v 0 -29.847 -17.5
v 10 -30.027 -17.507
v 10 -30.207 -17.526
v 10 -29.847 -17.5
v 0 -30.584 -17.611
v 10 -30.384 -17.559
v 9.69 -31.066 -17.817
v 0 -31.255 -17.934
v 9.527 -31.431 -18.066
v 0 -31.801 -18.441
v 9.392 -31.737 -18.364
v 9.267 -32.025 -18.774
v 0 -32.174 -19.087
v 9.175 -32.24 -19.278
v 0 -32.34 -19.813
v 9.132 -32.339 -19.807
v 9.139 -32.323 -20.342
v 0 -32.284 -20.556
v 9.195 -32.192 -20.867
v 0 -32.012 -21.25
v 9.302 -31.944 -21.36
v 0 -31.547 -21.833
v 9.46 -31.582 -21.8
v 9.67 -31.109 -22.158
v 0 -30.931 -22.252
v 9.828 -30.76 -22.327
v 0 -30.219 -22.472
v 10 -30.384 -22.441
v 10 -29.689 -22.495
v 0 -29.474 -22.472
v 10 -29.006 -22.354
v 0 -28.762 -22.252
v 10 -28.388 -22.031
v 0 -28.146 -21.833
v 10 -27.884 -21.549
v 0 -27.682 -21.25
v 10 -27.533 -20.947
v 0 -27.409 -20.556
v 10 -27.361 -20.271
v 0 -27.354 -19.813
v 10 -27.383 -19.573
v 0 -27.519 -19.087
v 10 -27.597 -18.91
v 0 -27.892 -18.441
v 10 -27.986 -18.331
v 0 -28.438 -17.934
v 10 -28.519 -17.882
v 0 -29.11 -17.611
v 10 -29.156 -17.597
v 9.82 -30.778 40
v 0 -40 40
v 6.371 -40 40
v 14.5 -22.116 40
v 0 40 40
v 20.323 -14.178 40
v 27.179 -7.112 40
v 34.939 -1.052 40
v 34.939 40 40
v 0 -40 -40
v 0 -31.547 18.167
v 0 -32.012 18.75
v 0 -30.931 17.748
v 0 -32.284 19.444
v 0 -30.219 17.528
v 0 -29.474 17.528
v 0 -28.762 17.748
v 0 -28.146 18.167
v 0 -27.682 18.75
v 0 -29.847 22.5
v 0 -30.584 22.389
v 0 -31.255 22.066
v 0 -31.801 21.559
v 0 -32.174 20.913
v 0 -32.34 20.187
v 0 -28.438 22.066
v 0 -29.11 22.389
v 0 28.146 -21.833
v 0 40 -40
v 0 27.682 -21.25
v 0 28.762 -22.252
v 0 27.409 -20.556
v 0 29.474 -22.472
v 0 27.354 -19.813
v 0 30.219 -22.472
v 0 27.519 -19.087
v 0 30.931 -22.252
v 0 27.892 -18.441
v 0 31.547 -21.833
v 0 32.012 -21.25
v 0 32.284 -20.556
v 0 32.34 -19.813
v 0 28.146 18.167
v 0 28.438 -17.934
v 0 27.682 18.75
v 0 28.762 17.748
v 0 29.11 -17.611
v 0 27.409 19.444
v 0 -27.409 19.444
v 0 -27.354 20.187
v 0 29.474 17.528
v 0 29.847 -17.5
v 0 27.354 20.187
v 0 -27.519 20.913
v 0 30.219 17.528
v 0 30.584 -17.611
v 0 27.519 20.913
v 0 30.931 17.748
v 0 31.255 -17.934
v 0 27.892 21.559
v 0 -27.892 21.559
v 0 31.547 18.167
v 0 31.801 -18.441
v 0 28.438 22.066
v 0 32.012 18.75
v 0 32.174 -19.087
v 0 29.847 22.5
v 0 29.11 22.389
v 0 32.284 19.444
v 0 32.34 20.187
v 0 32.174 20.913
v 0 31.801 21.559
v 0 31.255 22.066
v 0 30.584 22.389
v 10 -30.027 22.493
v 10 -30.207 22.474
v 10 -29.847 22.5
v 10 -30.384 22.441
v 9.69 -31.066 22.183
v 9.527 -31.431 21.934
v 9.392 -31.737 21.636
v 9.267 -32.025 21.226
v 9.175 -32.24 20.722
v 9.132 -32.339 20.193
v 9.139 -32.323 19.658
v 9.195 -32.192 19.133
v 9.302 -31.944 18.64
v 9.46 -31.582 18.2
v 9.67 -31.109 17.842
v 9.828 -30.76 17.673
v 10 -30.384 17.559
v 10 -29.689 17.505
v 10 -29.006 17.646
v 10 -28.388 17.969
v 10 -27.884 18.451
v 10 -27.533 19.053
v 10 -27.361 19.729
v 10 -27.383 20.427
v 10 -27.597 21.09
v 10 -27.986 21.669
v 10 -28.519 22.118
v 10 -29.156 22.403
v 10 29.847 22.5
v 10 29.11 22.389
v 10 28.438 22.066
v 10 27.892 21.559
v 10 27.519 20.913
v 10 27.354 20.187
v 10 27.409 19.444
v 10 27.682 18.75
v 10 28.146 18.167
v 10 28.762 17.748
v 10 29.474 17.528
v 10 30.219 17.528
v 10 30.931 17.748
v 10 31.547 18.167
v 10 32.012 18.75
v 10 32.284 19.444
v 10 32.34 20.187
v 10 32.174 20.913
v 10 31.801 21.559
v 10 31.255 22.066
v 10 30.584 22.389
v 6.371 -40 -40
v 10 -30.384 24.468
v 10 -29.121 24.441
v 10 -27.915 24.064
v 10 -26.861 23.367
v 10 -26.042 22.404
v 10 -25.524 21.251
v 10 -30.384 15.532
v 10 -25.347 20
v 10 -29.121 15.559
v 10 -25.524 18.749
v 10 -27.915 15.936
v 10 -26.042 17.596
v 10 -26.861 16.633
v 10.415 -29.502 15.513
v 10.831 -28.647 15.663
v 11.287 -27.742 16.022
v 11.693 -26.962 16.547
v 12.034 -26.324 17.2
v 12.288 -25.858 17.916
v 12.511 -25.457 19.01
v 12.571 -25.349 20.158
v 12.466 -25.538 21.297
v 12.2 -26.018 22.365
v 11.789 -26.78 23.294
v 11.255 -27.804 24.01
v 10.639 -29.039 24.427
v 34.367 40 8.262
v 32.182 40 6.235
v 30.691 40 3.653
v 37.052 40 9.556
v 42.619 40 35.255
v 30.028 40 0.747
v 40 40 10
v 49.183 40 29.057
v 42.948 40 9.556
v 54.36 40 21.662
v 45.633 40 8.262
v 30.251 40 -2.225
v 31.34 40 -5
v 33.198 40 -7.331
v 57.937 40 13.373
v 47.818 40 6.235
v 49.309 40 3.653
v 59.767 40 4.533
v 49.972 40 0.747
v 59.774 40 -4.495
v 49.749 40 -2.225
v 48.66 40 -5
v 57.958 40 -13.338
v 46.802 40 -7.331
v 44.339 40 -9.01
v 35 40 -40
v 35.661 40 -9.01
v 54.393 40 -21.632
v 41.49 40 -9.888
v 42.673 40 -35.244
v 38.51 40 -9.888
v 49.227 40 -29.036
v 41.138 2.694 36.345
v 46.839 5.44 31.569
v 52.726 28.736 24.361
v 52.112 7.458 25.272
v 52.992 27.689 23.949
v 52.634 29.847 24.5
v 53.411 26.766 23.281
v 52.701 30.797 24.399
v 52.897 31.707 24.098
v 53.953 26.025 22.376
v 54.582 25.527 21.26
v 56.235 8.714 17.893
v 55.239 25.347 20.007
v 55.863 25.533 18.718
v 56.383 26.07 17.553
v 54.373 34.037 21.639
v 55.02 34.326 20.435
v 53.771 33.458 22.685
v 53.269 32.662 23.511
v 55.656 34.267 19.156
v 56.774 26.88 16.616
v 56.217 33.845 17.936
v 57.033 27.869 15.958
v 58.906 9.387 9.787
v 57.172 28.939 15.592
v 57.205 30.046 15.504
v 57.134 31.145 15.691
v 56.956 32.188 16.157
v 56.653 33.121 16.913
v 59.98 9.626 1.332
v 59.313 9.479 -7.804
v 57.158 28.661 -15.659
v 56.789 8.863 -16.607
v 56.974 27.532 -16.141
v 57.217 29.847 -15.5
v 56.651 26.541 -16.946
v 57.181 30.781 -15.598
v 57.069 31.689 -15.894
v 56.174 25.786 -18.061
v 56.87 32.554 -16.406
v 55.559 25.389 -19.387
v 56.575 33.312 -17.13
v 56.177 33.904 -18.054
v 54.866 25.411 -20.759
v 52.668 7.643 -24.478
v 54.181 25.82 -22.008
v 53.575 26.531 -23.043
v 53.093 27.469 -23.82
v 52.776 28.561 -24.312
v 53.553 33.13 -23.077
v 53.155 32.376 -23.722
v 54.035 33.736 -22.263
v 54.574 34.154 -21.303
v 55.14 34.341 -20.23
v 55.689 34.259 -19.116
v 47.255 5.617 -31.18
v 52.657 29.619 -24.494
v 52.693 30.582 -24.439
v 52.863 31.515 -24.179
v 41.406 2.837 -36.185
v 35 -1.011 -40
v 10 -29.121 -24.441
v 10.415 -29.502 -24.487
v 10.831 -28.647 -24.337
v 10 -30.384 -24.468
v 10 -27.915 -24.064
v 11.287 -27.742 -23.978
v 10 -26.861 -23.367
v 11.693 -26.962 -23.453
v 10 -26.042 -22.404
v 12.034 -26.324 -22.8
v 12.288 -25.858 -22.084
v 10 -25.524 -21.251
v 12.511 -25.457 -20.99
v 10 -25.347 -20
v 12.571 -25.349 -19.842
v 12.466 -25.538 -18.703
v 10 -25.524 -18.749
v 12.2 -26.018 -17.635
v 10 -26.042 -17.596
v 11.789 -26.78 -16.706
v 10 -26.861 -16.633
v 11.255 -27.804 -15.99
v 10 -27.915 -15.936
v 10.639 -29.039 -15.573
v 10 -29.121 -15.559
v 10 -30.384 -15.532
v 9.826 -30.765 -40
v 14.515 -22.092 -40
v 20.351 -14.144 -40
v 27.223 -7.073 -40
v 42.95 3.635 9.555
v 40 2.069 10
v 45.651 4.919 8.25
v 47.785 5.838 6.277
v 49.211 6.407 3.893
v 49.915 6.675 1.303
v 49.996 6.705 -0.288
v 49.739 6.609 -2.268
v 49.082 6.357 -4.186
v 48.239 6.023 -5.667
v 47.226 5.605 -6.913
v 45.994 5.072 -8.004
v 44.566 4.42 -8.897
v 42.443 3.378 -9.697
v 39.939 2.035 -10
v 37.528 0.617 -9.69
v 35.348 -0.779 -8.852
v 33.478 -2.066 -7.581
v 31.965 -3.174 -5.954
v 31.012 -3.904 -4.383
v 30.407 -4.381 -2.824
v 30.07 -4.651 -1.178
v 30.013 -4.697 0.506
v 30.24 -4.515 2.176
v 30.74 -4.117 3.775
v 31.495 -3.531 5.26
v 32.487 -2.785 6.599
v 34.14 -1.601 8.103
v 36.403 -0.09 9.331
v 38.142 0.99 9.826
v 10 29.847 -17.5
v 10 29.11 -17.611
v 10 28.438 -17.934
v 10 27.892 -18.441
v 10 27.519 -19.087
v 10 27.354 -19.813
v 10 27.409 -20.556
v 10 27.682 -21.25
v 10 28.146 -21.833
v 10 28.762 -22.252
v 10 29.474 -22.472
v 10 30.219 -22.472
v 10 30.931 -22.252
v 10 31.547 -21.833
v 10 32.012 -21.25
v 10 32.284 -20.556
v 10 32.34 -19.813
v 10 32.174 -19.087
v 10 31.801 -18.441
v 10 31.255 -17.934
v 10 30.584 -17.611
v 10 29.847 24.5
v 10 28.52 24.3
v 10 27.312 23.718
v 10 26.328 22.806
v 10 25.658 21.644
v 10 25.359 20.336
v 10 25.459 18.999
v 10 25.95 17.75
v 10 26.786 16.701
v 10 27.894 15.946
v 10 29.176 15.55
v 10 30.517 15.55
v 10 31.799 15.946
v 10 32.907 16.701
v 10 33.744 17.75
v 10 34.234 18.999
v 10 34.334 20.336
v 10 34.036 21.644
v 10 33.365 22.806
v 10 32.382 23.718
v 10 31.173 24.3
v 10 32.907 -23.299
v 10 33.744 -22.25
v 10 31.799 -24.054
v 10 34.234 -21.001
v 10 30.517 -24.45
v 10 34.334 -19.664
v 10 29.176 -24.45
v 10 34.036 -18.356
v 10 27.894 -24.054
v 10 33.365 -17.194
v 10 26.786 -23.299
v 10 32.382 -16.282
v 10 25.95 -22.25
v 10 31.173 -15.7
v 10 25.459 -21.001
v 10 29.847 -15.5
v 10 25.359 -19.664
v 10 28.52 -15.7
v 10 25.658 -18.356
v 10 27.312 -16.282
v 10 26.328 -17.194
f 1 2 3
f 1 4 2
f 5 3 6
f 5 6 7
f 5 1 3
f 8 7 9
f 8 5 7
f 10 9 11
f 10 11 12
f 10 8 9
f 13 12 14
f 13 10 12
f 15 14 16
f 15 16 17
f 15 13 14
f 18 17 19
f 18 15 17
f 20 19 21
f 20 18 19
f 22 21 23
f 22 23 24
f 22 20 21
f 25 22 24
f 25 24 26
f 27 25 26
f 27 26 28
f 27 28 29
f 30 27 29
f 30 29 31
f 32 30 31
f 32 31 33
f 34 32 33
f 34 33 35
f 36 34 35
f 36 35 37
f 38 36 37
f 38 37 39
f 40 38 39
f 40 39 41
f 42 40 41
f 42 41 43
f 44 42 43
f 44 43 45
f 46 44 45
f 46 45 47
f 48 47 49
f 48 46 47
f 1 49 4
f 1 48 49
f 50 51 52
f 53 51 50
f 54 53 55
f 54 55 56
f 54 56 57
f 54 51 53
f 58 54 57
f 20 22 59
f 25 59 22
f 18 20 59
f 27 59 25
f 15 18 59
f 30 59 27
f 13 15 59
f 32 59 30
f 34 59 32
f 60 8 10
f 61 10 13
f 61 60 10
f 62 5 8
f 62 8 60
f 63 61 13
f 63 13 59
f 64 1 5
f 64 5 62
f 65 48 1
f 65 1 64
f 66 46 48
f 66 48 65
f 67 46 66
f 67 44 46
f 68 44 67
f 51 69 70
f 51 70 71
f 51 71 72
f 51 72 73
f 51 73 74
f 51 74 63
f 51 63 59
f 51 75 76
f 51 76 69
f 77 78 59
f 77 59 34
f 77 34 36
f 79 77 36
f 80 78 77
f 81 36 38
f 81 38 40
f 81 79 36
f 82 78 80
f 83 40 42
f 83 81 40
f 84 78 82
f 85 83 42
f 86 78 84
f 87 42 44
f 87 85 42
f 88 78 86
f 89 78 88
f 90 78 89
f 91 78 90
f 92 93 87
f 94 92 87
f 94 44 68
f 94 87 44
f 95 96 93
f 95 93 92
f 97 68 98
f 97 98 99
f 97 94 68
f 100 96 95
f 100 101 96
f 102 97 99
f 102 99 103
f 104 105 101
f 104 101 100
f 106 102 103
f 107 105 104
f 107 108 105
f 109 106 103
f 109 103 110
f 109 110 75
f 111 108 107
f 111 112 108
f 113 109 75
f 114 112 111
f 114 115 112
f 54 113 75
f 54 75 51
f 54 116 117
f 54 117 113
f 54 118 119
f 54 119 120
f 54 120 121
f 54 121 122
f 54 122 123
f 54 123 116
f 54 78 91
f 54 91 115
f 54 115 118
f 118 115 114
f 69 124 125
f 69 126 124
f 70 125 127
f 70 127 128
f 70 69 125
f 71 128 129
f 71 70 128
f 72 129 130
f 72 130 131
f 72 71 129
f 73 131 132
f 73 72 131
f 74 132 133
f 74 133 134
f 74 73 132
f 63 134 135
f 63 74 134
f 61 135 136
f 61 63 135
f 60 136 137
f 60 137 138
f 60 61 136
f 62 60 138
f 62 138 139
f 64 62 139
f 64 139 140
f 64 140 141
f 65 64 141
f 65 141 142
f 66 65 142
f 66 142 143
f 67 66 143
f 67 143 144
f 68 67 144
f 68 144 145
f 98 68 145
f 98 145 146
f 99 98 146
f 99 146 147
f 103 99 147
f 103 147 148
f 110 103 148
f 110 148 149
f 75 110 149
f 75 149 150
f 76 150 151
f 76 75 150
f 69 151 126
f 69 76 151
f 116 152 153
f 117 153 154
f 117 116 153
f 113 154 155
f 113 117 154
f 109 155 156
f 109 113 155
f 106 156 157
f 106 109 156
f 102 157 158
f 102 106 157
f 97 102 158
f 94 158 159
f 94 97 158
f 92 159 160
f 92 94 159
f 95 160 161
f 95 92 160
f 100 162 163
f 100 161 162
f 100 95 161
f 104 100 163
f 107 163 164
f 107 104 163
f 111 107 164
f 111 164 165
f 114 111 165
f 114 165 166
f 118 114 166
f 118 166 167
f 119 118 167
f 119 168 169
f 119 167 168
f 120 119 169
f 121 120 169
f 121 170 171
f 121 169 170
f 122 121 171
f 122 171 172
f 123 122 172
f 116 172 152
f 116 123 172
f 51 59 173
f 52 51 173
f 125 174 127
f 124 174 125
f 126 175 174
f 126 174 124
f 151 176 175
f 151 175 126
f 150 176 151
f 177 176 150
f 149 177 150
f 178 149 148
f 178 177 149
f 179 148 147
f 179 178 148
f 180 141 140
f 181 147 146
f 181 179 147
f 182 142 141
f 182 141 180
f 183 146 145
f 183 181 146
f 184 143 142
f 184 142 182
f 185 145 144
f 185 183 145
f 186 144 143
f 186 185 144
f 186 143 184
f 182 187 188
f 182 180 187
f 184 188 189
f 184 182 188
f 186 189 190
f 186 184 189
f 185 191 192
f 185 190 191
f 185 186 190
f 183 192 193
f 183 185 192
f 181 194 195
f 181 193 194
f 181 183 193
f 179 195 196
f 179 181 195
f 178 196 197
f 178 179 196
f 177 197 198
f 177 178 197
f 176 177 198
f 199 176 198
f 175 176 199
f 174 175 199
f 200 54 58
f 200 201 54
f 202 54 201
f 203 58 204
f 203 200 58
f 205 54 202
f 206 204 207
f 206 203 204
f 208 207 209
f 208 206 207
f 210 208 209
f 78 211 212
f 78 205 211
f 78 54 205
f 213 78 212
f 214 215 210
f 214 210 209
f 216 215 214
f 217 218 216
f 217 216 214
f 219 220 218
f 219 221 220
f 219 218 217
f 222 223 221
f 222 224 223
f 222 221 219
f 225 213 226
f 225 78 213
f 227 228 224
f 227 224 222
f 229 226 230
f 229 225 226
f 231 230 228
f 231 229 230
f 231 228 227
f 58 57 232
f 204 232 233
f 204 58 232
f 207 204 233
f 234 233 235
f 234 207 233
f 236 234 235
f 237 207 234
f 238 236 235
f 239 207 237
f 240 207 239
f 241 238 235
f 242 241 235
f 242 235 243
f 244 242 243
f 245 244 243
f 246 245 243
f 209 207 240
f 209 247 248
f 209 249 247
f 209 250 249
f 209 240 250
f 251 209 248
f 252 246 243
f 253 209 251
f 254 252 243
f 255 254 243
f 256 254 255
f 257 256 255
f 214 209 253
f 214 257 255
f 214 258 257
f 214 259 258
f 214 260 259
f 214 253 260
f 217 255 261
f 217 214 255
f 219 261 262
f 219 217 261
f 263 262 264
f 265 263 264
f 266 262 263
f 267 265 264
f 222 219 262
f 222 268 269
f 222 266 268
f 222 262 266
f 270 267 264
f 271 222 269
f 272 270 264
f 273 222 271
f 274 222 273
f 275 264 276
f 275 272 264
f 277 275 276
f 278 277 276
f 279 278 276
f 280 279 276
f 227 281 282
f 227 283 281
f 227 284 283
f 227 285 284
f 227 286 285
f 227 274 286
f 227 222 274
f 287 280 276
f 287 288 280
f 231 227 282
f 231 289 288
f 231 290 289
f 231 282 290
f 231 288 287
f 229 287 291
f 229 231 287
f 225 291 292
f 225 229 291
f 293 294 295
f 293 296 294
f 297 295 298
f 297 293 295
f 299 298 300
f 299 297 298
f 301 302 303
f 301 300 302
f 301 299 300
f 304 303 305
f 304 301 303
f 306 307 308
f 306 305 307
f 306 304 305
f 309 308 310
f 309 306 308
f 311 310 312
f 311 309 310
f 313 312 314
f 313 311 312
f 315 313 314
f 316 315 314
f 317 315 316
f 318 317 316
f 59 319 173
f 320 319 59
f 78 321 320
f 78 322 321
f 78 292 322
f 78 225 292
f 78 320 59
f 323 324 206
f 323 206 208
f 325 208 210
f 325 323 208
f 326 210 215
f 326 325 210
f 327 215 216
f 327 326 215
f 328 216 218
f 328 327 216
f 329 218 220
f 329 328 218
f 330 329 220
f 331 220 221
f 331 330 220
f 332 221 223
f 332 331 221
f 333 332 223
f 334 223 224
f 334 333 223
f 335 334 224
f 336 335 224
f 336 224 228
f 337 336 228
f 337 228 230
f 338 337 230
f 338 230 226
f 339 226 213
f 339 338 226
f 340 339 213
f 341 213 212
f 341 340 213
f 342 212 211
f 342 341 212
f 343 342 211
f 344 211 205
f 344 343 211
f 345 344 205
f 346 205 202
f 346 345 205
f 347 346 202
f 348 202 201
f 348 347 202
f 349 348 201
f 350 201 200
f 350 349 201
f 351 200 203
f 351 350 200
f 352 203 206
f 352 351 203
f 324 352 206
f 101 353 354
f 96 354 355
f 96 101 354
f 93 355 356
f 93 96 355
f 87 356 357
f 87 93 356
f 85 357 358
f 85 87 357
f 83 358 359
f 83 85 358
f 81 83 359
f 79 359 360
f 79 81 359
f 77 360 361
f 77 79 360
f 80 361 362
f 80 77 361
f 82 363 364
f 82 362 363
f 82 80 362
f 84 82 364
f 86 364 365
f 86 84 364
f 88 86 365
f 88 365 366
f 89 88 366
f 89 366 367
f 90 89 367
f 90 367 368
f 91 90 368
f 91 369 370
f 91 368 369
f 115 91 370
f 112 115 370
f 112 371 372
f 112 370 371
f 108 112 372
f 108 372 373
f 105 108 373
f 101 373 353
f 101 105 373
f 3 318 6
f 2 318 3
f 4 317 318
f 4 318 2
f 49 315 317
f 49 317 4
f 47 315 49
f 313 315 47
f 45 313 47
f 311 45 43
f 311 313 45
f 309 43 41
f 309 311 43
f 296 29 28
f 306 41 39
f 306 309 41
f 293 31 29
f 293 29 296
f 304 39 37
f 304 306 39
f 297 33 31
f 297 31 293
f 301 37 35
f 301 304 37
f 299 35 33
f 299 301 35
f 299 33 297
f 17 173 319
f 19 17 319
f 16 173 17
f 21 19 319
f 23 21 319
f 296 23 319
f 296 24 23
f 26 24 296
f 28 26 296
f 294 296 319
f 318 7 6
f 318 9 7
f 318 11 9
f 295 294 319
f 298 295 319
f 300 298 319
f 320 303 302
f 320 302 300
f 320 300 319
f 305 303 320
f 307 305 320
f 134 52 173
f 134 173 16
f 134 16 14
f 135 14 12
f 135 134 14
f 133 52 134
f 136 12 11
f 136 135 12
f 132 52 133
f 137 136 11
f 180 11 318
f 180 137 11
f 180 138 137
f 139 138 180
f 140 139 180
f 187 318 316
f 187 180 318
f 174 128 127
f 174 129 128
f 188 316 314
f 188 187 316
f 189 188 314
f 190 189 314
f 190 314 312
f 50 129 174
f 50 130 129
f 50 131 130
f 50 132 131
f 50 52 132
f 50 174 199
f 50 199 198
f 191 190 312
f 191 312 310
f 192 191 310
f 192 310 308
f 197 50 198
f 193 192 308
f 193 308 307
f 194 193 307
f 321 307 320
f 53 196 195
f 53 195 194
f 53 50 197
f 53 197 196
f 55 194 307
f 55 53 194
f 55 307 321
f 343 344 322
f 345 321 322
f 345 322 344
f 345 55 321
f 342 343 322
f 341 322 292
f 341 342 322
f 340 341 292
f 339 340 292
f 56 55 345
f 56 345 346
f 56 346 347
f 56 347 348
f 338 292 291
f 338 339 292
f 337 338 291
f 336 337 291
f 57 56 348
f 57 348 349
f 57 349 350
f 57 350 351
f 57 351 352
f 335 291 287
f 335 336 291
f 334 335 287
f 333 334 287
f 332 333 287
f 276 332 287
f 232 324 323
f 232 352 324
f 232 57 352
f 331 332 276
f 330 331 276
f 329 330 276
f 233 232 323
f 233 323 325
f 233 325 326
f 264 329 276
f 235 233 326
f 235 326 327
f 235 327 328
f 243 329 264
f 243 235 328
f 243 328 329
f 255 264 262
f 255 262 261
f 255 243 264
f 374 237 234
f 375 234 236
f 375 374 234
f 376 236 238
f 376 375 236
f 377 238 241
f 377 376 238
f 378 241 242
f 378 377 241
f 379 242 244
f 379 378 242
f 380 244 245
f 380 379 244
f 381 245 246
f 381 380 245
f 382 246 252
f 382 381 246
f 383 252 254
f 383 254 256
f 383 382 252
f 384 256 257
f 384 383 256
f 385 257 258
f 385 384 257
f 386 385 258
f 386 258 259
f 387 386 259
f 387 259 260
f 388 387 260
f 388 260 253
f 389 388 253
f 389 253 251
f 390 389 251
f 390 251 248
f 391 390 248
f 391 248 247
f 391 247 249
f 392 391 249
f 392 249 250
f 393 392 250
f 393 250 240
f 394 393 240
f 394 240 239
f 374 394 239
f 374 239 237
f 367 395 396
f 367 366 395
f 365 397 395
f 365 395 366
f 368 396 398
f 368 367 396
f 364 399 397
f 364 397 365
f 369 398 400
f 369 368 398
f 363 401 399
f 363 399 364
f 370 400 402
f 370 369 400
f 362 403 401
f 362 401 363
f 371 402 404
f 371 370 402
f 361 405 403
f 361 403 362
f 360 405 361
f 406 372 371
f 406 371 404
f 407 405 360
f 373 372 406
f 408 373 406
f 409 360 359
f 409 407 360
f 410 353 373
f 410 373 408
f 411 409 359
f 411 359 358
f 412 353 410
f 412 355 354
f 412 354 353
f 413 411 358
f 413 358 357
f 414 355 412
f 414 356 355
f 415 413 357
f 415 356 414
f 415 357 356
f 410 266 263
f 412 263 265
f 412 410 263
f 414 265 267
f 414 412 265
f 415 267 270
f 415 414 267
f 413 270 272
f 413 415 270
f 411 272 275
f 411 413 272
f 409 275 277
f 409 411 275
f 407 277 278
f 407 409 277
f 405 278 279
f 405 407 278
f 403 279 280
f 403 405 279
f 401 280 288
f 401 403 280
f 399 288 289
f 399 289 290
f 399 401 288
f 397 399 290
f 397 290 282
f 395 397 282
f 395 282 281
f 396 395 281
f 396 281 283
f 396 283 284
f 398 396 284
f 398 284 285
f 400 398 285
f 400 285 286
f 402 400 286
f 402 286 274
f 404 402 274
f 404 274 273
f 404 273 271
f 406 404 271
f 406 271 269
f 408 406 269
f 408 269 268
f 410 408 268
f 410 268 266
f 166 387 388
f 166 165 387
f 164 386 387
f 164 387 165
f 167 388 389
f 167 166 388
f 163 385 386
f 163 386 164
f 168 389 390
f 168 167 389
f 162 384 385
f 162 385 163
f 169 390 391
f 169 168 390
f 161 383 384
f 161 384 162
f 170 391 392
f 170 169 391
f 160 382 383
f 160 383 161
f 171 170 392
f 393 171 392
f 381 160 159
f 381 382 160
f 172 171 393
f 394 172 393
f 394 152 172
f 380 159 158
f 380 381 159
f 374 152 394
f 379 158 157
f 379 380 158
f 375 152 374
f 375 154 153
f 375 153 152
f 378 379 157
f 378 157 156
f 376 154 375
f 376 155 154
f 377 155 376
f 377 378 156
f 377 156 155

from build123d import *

# Parameters (mm, degrees)
SKETCH2_R           = 10
BOSS_EXTRUDE1_DEPTH = 40
CUT_EXTRUDE1_DEPTH  = 40
SKETCH4_R           = 2.5
CUT_EXTRUDE2_DEPTH  = 80
SKETCH5_R           = 4.5
CUT_EXTRUDE3_DEPTH  = 80


with BuildPart() as part:
    # Sketch2 → Boss-Extrude1 (new, symmetric)
    with BuildSketch(Plane(origin=(0, 0, 0), x_dir=(1, 0, 0), z_dir=(0, 1, 0))):
        with BuildLine():
            Line((0, 40), (0, -40))
            Line((0, -40), (34.939220954, -40))
            ThreePointArc((34.939220954, -40), (60, -0.01901654), (35, 40))
            Line((35, 40), (0, 40))
        make_face()
        with Locations(Location((40, 0, 0), (0, 0, 270))):
            Circle(SKETCH2_R, mode=Mode.SUBTRACT)
    extrude(amount=BOSS_EXTRUDE1_DEPTH, both=True)

    # Sketch3 → Cut-Extrude1 (cut, symmetric)
    with BuildSketch(Plane.XY):
        with BuildLine():
            Line((60.000012836, 9.630791914), (60.000012836, -40))
            Line((60.000012836, -40), (6.370793002, -40))
            ThreePointArc((6.370793002, -40), (26.384718506, -7.836033018), (60.000012836, 9.630791914))
        make_face()
    extrude(amount=CUT_EXTRUDE1_DEPTH, both=True, mode=Mode.SUBTRACT)

    # Sketch4 → Cut-Extrude2 (cut)
    with BuildSketch(Plane(origin=(0, 0, 0), x_dir=(0, 0, -1), z_dir=(1, 0, 0))):
        with Locations(Location((-20, 29.846630116, 0), (0, 0, 180))):
            Circle(SKETCH4_R)
        with Locations(Location((20, 29.846630116, 0), (0, 0, 180))):
            Circle(SKETCH4_R)
        with Locations(Location((20, -29.846630116, 0), (0, 0, 180))):
            Circle(SKETCH4_R)
        with Locations(Location((-20, -29.846630116, 0), (0, 0, 180))):
            Circle(SKETCH4_R)
    extrude(amount=CUT_EXTRUDE2_DEPTH, mode=Mode.SUBTRACT)

    # Sketch5 → Cut-Extrude3 (cut)
    with BuildSketch(Plane(origin=(10, 0, 0), x_dir=(0, 0, -1), z_dir=(1, 0, 0))):
        with Locations(Location((20, 29.846630116, 0), (0, 0, 180))):
            Circle(SKETCH5_R)
        with Locations(Location((-20, 29.846630116, 0), (0, 0, 180))):
            Circle(SKETCH5_R)
        with Locations((20, -29.846630116)):
            Circle(SKETCH5_R)
        with Locations((-20, -29.846630116)):
            Circle(SKETCH5_R)
    extrude(amount=CUT_EXTRUDE3_DEPTH, mode=Mode.SUBTRACT)


solid = part.part
